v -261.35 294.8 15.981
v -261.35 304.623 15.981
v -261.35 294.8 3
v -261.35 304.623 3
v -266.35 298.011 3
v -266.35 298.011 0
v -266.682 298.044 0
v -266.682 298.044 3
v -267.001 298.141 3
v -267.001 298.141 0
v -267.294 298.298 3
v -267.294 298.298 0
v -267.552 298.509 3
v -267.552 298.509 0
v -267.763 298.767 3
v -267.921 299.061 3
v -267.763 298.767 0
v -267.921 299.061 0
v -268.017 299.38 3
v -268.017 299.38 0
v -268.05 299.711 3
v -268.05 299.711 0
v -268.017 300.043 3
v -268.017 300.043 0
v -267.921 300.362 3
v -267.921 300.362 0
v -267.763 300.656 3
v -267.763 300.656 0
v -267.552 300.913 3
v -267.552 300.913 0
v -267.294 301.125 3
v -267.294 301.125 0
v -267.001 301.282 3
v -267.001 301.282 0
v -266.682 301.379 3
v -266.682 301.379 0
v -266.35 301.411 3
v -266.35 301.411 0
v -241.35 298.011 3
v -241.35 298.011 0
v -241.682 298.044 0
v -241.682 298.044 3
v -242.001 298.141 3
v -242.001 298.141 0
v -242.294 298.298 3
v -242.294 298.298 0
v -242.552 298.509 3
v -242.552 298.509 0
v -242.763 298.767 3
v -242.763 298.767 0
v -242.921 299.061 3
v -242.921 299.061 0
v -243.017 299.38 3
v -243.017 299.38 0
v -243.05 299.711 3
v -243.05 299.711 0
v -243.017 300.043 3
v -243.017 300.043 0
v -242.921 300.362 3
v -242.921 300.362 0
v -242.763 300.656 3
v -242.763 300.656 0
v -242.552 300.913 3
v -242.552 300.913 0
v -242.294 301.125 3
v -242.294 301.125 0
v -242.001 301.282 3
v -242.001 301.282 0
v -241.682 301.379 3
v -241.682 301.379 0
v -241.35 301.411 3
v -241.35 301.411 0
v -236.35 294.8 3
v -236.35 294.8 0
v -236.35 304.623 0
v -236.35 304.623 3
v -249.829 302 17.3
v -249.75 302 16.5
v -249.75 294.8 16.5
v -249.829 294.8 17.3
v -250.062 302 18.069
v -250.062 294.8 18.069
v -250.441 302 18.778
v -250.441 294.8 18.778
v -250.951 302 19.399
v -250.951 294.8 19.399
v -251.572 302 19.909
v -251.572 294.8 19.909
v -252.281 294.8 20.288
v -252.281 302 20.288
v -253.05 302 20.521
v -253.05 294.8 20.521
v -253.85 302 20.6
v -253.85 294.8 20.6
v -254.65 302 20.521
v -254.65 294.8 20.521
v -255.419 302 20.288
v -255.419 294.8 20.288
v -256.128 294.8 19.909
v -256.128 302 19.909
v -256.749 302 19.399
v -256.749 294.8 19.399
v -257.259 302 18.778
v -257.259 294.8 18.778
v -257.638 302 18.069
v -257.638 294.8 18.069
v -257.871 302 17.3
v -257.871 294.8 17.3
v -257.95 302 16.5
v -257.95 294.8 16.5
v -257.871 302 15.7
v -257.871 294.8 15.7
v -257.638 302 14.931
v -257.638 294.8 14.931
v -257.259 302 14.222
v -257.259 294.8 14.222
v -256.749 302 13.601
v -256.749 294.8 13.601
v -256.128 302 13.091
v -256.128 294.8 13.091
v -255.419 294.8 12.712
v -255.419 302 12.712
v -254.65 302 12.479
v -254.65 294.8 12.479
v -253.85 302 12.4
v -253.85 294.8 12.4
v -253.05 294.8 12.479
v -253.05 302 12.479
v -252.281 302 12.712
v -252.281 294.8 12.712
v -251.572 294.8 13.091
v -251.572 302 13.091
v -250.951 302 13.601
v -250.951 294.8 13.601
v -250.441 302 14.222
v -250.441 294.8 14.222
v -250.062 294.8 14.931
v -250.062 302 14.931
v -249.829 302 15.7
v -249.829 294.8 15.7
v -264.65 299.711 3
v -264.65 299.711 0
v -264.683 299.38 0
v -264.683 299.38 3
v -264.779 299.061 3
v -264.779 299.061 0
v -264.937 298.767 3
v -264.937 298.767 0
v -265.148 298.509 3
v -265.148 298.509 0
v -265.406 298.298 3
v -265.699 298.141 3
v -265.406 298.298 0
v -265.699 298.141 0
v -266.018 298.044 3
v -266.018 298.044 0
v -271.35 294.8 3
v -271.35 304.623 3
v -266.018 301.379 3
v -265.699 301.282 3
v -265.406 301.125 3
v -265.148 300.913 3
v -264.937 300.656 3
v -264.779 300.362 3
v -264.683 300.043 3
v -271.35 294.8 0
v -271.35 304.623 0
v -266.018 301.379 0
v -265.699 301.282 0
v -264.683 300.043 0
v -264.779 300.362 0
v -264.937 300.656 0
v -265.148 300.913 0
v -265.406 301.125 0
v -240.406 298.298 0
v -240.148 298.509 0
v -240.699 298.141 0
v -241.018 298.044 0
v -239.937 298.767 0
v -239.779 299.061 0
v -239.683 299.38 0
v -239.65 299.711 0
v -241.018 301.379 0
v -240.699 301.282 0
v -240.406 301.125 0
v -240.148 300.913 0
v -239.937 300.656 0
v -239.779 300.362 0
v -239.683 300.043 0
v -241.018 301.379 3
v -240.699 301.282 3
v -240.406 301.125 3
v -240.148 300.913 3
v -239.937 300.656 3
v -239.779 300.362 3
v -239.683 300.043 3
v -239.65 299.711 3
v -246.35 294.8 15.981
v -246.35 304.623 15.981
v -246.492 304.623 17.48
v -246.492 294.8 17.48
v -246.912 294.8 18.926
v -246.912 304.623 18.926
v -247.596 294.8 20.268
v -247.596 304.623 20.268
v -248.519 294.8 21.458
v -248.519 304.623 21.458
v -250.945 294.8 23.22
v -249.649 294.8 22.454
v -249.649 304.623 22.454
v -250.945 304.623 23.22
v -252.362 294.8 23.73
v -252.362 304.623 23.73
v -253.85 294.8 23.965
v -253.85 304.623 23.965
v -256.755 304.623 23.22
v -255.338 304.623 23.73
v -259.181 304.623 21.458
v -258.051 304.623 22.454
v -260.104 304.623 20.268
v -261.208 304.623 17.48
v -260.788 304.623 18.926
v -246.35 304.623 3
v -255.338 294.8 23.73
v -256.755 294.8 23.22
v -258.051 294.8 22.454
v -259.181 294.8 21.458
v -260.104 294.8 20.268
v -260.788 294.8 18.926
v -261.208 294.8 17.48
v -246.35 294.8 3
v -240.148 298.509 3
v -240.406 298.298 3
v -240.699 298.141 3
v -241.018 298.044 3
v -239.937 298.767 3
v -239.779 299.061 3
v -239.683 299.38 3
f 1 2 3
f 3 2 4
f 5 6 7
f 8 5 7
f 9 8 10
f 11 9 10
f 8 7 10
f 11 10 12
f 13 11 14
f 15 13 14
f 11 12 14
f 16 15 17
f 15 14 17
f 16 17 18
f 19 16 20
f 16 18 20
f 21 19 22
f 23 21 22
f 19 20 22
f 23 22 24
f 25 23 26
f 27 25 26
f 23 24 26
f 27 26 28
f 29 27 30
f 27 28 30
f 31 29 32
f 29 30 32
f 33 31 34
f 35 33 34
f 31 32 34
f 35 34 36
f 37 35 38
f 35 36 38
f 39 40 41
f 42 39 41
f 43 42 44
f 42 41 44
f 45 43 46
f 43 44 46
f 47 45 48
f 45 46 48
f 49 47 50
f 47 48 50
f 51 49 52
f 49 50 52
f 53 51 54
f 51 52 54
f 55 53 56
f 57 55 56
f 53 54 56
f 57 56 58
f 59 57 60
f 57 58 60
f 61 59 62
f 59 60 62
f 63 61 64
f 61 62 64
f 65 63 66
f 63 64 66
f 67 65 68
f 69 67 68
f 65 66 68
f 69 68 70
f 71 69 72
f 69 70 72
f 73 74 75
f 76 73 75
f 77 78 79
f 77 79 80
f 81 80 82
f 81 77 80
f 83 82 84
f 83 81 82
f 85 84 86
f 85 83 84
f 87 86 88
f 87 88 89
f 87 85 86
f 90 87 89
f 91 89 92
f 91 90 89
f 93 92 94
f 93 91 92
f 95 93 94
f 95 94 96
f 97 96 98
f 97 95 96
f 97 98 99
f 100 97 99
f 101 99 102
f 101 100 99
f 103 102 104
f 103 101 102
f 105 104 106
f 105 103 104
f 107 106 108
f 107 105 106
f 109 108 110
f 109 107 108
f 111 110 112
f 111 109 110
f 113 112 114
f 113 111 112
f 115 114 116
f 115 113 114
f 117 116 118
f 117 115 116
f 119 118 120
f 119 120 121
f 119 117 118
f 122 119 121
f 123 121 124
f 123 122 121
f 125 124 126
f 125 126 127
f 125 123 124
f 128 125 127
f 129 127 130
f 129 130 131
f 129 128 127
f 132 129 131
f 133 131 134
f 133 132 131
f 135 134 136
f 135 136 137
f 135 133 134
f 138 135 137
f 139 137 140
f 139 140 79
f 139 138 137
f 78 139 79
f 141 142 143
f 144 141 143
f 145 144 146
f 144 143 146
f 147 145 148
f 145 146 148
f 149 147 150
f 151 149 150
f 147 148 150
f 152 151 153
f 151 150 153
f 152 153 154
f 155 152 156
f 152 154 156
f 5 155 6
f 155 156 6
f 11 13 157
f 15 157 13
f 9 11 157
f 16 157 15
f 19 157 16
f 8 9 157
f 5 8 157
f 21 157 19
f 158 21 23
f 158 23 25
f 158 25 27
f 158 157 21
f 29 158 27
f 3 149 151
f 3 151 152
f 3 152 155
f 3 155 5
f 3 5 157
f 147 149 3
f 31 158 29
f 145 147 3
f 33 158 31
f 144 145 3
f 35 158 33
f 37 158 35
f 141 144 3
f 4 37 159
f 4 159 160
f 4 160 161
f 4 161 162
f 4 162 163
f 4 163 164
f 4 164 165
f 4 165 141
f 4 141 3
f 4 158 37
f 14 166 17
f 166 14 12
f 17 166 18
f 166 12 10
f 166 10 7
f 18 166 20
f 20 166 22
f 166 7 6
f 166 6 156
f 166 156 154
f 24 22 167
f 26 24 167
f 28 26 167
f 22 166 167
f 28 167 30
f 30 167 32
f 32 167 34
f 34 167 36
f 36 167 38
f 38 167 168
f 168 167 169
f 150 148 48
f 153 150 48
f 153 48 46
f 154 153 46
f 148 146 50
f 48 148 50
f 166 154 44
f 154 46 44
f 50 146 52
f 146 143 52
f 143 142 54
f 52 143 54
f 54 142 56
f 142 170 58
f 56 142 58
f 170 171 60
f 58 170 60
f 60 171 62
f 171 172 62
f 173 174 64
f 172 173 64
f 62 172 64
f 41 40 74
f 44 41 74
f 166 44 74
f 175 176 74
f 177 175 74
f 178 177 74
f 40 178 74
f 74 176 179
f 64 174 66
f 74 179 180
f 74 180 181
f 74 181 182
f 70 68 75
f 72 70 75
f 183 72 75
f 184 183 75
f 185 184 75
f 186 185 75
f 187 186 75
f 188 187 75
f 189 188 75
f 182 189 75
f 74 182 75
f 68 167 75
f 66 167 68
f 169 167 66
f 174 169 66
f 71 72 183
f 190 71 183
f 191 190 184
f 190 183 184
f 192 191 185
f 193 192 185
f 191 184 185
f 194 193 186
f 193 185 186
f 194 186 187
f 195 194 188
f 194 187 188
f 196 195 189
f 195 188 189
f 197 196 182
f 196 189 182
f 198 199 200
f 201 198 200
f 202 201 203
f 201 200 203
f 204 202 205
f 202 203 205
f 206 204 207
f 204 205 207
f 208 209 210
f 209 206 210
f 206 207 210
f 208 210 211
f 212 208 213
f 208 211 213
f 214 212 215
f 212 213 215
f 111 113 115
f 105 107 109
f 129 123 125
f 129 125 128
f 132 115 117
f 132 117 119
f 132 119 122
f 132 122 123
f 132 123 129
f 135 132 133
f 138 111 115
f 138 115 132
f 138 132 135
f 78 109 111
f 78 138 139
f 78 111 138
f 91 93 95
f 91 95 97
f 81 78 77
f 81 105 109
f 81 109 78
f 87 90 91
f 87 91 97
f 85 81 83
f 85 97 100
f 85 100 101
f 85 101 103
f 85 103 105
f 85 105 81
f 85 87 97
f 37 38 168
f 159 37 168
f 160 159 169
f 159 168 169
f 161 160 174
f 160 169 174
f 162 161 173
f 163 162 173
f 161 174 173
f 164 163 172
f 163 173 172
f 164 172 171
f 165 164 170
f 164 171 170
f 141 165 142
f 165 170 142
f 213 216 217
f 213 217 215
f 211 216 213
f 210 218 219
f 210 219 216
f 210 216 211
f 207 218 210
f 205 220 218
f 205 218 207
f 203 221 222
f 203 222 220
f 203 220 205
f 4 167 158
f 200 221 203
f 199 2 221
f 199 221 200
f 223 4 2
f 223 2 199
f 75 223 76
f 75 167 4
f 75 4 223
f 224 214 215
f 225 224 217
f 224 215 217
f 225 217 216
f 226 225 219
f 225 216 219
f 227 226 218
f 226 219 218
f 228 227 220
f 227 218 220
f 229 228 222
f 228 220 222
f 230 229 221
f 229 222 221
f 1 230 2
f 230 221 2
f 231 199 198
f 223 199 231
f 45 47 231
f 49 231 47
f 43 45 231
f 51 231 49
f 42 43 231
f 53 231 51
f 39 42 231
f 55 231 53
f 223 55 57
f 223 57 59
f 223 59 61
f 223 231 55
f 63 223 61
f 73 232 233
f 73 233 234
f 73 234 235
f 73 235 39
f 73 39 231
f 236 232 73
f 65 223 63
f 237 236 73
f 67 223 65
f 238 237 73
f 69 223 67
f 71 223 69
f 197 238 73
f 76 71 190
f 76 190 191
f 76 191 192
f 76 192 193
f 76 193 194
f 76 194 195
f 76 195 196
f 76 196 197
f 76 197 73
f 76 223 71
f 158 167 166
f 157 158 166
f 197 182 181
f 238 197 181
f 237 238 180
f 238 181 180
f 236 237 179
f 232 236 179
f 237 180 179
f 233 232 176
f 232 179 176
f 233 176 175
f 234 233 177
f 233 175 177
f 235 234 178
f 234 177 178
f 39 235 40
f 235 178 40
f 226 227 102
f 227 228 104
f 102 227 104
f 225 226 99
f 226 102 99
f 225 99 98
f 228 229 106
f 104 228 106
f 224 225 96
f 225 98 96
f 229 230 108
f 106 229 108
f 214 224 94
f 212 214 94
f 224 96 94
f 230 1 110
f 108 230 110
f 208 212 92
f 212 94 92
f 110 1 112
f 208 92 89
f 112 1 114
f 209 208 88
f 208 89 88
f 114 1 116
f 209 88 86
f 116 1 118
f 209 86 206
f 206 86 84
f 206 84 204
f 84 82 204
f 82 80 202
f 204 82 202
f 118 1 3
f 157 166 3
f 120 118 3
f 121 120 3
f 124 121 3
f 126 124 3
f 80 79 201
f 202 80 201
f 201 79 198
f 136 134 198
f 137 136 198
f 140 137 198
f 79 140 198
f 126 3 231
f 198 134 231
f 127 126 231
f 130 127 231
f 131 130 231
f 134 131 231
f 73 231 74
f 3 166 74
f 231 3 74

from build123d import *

# Parameters (mm, degrees)
BOSS_EXTRUDE1_DEPTH = 3
SKETCH2_W           = 15
SKETCH2_H           = 21.14750363
BOSS_EXTRUDE2_DEPTH = 9.822712027
FILLET1_R           = 8
CUT_EXTRUDE1_START  = -7.2
SKETCH3_R           = 4.1
CUT_EXTRUDE1_DEPTH  = 7.2


with BuildPart() as part:
    # Sketch1 → Boss-Extrude1 (new body)
    with BuildSketch(Plane.XY):
        with BuildLine():
            Line((-241.35, 304.622712027), (-266.35, 304.622712027))
            Line((-266.35, 304.622712027), (-266.35, 301.411356013))
            ThreePointArc((-266.35, 301.411356013), (-265.147918472, 300.913437541), (-264.65, 299.711356013))
            ThreePointArc((-264.65, 299.711356013), (-265.147918472, 298.509274485), (-266.35, 298.011356013))
            Line((-266.35, 298.011356013), (-266.35, 294.8))
            Line((-266.35, 294.8), (-241.35, 294.8))
            Line((-241.35, 294.8), (-241.35, 298.011356013))
            ThreePointArc((-241.35, 298.011356013), (-243.05, 299.711356013), (-241.35, 301.411356013))
            Line((-241.35, 301.411356013), (-241.35, 304.622712027))
        make_face()
        with BuildLine():
            Line((-266.35, 304.622712027), (-271.35, 304.622712027))
            Line((-271.35, 304.622712027), (-271.35, 294.8))
            Line((-271.35, 294.8), (-269.799999998, 294.8))
            Line((-269.799999998, 294.8), (-266.35, 294.8))
            Line((-266.35, 294.8), (-266.35, 298.011356013))
            ThreePointArc((-266.35, 298.011356013), (-268.05, 299.711356013), (-266.35, 301.411356013))
            Line((-266.35, 301.411356013), (-266.35, 304.622712027))
        make_face()
        with BuildLine():
            Line((-236.35, 304.622712027), (-241.35, 304.622712027))
            Line((-241.35, 304.622712027), (-241.35, 301.411356013))
            ThreePointArc((-241.35, 301.411356013), (-240.147918472, 300.913437541), (-239.65, 299.711356013))
            ThreePointArc((-239.65, 299.711356013), (-240.147918472, 298.509274485), (-241.35, 298.011356013))
            Line((-241.35, 298.011356013), (-241.35, 294.8))
            Line((-241.35, 294.8), (-236.35, 294.8))
            Line((-236.35, 294.8), (-236.35, 304.622712027))
        make_face()
    extrude(amount=BOSS_EXTRUDE1_DEPTH)

    # Sketch2 → Boss-Extrude2 (add)
    with BuildSketch(Plane(origin=(0, 304.622712027, 0), x_dir=(1, 0, 0), z_dir=(0, 1, 0))):
        with Locations((-253.85, -13.407165318)):
            Rectangle(SKETCH2_W, SKETCH2_H)
    extrude(amount=-BOSS_EXTRUDE2_DEPTH)

    # Fillet1
    # the kernel refuses this fillet: 8 mm, written as the material it takes off along each edge
    with BuildSketch(Plane(origin=(-246.35, 324.622712027, 23.980917133), x_dir=(0, 0, -1), z_dir=(0, -1, 0))) as fillet1_piece_1:
        with BuildLine():
            CenterArc((FILLET1_R, -FILLET1_R), FILLET1_R, 90, 90)
            Line((0, -FILLET1_R), (0, 0))
            Line((0, 0), (FILLET1_R, 0))
        make_face()
    extrude(amount=49.822712027, mode=Mode.SUBTRACT)
    with BuildSketch(Plane(origin=(-261.35, 324.622712027, 23.980917133), x_dir=(0, 0, -1), z_dir=(0, -1, 0))) as fillet1_piece_2:
        with BuildLine():
            CenterArc((FILLET1_R, FILLET1_R), FILLET1_R, 180, 90)
            Line((0, FILLET1_R), (0, 0))
            Line((0, 0), (FILLET1_R, 0))
        make_face()
    extrude(amount=49.822712027, mode=Mode.SUBTRACT)

    # Sketch3 → Cut-Extrude1 (cut)
    with BuildSketch(Plane.XZ.offset(-294.8).offset(CUT_EXTRUDE1_START)):
        with Locations((-253.85, 16.5)):
            Circle(SKETCH3_R)
    extrude(amount=CUT_EXTRUDE1_DEPTH, mode=Mode.SUBTRACT)


solid = part.part
